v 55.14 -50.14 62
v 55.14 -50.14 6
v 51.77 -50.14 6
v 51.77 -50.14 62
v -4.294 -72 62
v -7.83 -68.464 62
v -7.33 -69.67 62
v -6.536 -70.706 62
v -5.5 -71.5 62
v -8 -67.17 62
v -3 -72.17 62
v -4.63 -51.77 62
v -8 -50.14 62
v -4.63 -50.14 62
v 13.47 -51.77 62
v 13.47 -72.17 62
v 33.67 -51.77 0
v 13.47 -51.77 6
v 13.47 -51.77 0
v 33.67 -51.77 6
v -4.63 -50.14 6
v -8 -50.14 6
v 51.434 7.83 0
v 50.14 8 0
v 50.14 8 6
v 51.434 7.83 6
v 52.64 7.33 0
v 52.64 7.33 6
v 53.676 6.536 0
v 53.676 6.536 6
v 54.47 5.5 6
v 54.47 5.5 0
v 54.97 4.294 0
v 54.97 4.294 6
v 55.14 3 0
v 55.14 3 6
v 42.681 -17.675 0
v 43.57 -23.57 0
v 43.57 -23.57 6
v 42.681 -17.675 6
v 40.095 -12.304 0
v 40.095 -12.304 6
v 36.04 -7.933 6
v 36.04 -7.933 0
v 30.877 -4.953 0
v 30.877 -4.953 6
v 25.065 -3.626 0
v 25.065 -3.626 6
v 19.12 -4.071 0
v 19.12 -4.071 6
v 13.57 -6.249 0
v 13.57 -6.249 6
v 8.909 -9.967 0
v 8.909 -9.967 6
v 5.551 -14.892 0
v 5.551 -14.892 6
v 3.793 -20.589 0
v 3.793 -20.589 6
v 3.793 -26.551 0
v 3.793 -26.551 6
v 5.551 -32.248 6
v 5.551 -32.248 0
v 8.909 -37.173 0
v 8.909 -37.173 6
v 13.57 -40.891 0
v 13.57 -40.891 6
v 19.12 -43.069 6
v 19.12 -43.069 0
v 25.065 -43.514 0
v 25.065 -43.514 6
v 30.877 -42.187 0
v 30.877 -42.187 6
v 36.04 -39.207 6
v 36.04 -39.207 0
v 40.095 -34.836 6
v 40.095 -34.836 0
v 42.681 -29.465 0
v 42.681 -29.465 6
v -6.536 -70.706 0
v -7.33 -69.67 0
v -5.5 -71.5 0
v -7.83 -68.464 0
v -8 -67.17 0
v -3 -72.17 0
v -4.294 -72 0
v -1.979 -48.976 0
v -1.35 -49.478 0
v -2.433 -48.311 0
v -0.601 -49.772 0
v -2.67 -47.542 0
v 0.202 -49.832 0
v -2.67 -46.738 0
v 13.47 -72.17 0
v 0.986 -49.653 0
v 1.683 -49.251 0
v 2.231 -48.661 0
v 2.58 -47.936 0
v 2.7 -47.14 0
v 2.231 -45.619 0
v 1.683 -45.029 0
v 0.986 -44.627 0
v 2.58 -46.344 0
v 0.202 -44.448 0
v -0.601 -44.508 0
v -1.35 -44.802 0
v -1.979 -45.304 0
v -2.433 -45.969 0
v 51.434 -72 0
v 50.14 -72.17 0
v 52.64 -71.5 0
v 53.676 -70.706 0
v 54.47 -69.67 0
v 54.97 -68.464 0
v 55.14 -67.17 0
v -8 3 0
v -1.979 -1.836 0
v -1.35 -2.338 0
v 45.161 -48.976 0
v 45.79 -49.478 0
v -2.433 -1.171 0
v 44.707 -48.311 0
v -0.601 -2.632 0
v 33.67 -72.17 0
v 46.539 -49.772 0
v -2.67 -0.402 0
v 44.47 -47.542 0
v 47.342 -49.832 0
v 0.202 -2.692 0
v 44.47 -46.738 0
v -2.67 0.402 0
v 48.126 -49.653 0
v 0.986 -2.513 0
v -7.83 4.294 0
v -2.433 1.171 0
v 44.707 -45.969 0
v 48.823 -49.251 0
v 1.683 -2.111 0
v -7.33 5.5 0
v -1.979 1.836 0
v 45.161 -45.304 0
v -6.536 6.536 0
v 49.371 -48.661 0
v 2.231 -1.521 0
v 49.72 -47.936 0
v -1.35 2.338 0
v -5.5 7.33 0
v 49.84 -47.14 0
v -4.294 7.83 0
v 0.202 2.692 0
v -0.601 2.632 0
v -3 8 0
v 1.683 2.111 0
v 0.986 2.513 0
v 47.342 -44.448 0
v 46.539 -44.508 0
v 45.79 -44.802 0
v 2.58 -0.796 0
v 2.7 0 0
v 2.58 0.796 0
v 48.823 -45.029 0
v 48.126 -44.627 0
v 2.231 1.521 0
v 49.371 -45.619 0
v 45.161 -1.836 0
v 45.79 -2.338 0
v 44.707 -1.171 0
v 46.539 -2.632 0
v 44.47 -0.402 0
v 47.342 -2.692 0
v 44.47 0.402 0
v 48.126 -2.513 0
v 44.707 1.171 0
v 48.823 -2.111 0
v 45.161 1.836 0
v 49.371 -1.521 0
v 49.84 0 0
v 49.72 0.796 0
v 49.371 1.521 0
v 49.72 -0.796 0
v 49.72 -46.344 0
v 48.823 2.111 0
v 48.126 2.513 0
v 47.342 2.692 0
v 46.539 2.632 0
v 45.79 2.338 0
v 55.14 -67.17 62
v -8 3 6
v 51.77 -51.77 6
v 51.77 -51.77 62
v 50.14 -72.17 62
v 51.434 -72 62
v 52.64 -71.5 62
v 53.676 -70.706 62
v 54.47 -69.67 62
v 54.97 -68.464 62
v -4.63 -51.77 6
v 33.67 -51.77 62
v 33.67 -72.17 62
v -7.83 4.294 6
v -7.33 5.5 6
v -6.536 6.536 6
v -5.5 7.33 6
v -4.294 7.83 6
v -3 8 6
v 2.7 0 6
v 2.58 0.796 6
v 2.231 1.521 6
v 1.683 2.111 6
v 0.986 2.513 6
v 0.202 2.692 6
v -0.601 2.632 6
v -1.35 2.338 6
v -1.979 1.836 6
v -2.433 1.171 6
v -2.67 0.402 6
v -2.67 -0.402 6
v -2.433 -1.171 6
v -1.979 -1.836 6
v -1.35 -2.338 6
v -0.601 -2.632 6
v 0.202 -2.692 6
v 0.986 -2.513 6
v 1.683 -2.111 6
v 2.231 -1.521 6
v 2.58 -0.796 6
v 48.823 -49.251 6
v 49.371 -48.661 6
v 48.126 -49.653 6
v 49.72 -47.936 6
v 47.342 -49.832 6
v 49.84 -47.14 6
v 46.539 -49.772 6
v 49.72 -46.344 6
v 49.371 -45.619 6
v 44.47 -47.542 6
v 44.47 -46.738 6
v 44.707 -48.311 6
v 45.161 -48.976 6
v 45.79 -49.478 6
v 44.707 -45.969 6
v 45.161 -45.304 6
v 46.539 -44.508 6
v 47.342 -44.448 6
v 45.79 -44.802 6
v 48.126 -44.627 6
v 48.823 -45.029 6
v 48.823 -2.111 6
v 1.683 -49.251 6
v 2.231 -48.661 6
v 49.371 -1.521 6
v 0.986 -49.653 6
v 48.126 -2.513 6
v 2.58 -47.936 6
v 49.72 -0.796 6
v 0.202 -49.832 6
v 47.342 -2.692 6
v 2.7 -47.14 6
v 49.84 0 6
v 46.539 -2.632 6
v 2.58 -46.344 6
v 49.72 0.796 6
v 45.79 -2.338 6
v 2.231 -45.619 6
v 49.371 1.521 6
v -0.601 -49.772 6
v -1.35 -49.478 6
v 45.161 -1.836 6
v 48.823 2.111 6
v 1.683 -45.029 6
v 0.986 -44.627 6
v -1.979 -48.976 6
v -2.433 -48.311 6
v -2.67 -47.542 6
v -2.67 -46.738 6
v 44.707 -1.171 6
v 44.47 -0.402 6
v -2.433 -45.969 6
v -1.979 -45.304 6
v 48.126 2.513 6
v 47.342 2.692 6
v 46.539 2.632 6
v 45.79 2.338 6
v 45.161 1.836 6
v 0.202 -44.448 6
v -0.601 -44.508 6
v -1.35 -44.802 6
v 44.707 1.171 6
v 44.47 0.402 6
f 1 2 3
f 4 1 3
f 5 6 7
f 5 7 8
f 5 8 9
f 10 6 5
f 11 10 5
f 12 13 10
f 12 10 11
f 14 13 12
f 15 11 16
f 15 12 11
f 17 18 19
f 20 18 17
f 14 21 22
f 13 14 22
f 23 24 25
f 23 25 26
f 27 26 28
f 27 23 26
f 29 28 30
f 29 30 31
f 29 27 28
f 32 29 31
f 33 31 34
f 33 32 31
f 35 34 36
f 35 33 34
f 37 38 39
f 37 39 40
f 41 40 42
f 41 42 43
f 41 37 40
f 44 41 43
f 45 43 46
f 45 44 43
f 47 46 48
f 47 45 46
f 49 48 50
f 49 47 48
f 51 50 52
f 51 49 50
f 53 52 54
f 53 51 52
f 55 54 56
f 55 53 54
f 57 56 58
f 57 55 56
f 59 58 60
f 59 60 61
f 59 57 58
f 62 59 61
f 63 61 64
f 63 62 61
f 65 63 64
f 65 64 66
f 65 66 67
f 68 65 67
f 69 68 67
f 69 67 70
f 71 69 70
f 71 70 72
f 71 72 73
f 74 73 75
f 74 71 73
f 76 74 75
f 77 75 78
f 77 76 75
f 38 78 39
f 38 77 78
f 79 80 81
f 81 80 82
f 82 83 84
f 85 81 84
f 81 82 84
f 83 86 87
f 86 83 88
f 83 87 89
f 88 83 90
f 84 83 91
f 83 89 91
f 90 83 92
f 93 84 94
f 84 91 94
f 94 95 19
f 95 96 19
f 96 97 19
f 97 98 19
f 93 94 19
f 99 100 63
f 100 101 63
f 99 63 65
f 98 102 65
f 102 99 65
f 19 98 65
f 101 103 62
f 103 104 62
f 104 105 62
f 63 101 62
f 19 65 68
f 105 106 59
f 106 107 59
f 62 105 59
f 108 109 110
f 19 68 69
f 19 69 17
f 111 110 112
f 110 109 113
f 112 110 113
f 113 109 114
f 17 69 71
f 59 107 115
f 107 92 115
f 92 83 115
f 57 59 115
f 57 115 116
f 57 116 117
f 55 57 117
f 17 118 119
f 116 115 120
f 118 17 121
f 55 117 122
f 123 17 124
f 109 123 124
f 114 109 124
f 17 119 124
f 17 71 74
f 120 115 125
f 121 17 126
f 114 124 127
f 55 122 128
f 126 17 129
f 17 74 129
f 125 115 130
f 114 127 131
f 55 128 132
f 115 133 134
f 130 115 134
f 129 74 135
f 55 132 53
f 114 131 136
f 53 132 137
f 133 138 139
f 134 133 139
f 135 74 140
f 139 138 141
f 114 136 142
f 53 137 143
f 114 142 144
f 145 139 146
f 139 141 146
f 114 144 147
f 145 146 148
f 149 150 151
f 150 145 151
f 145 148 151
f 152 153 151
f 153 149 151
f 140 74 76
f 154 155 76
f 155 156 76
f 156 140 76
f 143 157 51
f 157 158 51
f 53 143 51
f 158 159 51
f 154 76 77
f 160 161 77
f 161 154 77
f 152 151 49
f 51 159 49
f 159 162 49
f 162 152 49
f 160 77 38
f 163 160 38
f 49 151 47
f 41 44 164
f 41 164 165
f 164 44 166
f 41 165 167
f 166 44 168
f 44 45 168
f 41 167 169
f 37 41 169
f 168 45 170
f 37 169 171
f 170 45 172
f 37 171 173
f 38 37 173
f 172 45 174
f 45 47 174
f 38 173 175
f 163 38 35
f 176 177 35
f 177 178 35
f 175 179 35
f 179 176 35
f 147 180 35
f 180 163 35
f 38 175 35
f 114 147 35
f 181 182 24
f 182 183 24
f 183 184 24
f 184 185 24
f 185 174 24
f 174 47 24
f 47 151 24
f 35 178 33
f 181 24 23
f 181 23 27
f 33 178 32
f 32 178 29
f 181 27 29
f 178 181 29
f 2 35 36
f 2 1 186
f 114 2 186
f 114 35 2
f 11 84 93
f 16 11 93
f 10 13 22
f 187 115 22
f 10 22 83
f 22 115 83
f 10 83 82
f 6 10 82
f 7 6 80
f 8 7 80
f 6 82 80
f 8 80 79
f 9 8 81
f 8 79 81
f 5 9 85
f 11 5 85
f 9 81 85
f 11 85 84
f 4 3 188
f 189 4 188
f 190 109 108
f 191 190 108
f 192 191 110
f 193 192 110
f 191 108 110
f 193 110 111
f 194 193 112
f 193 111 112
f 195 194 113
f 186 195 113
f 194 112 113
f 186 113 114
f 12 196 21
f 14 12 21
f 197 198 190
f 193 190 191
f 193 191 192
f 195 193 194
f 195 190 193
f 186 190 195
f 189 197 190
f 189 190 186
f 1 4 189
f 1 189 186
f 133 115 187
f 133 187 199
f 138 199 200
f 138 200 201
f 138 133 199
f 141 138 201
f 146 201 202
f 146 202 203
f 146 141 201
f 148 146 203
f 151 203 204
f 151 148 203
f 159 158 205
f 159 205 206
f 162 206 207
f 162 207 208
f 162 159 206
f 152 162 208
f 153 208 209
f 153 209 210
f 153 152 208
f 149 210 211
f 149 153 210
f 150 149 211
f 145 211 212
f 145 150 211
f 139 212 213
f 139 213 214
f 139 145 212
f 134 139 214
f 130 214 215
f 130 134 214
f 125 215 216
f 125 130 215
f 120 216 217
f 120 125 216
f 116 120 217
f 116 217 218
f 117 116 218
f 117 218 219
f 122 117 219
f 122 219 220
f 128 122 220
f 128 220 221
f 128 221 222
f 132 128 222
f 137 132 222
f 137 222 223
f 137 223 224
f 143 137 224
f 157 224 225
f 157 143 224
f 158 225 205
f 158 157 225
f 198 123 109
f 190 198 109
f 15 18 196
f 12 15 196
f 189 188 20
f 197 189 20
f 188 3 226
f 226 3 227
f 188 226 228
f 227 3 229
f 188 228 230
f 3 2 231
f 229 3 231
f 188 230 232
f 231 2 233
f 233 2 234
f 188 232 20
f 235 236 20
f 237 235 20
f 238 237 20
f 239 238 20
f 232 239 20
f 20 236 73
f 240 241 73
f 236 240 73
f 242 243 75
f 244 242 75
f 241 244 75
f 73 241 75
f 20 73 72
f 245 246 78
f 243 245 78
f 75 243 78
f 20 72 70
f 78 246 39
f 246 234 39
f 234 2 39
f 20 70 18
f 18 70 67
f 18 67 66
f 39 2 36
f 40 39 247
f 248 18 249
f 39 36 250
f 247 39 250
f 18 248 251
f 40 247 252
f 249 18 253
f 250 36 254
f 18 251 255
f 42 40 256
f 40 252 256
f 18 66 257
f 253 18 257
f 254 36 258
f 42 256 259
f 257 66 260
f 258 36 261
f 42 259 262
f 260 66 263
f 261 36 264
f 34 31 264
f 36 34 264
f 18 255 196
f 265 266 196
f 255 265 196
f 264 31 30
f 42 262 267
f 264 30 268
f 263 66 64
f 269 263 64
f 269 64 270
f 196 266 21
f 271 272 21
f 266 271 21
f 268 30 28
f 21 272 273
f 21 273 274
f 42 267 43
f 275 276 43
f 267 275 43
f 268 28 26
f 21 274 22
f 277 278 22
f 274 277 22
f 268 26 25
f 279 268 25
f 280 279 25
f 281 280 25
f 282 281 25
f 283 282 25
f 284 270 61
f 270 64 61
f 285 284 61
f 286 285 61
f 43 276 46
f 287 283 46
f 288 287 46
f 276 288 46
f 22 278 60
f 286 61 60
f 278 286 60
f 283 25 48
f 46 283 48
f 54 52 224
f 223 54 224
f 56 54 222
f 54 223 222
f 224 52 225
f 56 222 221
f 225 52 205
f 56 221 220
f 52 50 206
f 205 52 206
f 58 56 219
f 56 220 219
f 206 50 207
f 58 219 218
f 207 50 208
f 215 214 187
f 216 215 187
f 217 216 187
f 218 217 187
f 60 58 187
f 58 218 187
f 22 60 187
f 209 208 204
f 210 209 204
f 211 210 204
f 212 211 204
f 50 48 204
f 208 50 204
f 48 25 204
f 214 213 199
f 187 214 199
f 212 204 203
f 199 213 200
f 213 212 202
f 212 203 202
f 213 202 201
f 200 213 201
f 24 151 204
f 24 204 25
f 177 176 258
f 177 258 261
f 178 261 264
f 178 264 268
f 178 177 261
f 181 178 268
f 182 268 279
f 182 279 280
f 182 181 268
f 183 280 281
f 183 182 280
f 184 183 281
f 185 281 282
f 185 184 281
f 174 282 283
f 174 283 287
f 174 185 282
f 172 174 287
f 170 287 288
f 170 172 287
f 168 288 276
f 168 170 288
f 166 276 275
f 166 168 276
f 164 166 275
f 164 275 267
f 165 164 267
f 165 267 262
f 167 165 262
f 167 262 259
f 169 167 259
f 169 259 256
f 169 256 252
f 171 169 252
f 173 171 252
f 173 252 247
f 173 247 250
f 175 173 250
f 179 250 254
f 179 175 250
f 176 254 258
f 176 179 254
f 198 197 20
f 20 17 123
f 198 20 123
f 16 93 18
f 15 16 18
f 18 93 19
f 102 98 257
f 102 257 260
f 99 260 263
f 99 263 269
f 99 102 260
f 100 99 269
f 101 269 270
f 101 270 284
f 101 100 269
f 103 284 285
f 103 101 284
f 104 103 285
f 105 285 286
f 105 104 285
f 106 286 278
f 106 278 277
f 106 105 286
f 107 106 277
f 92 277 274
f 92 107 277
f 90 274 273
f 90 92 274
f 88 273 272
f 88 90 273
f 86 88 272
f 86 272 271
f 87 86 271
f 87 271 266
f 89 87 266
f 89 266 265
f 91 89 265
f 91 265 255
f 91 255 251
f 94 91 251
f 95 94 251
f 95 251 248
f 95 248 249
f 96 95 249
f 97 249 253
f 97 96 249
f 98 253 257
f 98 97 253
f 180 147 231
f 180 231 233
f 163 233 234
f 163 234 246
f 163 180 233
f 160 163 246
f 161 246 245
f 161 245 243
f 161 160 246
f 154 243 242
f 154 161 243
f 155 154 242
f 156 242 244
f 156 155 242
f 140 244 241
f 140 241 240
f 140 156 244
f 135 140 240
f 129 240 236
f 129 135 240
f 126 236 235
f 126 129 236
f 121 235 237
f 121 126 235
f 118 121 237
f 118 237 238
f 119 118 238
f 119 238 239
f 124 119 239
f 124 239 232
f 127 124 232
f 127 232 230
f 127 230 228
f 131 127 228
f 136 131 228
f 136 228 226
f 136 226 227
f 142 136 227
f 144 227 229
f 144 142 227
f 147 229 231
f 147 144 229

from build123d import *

# Parameters (mm, degrees)
CROQUIS1_R                   = 2.7
CROQUIS1_R_2                 = 20
SALIENTE_EXTRUIR1_DEPTH      = 6
SALIENTE_EXTRUIR2_DEPTH      = 56
SALIENTE_EXTRUIR2_DEPTH_BACK = 6
CROQUIS3_W                   = 20.2
CROQUIS3_H                   = 20.4
CORTAR_EXTRUIR1_DEPTH        = 110.967852121


with BuildPart() as part:
    # Croquis1 → Saliente-Extruir1 (new body)
    with BuildSketch(Plane.XY):
        with BuildLine():
            Line((-8, -50.14), (-8, 3))
            ThreePointArc((-8, 3), (-6.535533906, 6.535533906), (-3, 8))
            Line((-3, 8), (50.14, 8))
            ThreePointArc((50.14, 8), (53.675533906, 6.535533906), (55.14, 3))
            Line((55.14, 3), (55.14, -50.14))
            ThreePointArc((55.14, -50.14), (53.675533906, -53.675533906), (50.14, -55.14))
            Line((50.14, -55.14), (-3, -55.14))
            ThreePointArc((-3, -55.14), (-6.535533906, -53.675533906), (-8, -50.14))
        make_face()
        Circle(CROQUIS1_R, mode=Mode.SUBTRACT)
        with Locations((47.14, 0)):
            Circle(CROQUIS1_R, mode=Mode.SUBTRACT)
        with Locations((47.14, -47.14)):
            Circle(CROQUIS1_R, mode=Mode.SUBTRACT)
        with Locations((0, -47.14)):
            Circle(CROQUIS1_R, mode=Mode.SUBTRACT)
        with Locations((23.57, -23.57)):
            Circle(CROQUIS1_R_2, mode=Mode.SUBTRACT)
    extrude(amount=SALIENTE_EXTRUIR1_DEPTH)

    # Croquis2 → Saliente-Extruir2 (add, two sides: drawn at the far end of the back side and taken through both)
    with BuildSketch(Plane.XY.offset(6).offset(-SALIENTE_EXTRUIR2_DEPTH_BACK)):
        with BuildLine():
            ThreePointArc((-3, -55.14), (-6.535533906, -53.675533906), (-8, -50.14))
            Line((-8, -50.14), (-8, -67.17))
            ThreePointArc((-8, -67.17), (-6.535533906, -70.705533906), (-3, -72.17))
            Line((-3, -72.17), (13.47, -72.17))
            Line((13.47, -72.17), (13.47, -55.14))
            Line((13.47, -55.14), (-3, -55.14))
        make_face()
        with BuildLine():
            Line((55.14, -67.17), (55.14, -50.14))
            ThreePointArc((55.14, -50.14), (53.675533906, -53.675533906), (50.14, -55.14))
            Line((50.14, -55.14), (33.67, -55.14))
            Line((33.67, -55.14), (33.67, -72.17))
            Line((33.67, -72.17), (50.14, -72.17))
            ThreePointArc((50.14, -72.17), (53.675533906, -70.705533906), (55.14, -67.17))
        make_face()
        with BuildLine():
            Line((13.47, -51.77), (-4.63, -51.77))
            Line((-4.63, -51.77), (-4.63, -50.14))
            Line((-4.63, -50.14), (-8, -50.14))
            ThreePointArc((-8, -50.14), (-6.535533906, -53.675533906), (-3, -55.14))
            Line((-3, -55.14), (13.47, -55.14))
            Line((13.47, -55.14), (13.47, -51.77))
        make_face()
        with BuildLine():
            Line((55.14, -50.14), (51.77, -50.14))
            Line((51.77, -50.14), (51.77, -51.77))
            Line((51.77, -51.77), (33.67, -51.77))
            Line((33.67, -51.77), (33.67, -55.14))
            Line((33.67, -55.14), (50.14, -55.14))
            ThreePointArc((50.14, -55.14), (53.675533906, -53.675533906), (55.14, -50.14))
        make_face()
    extrude(amount=SALIENTE_EXTRUIR2_DEPTH + SALIENTE_EXTRUIR2_DEPTH_BACK)

    # Croquis3 → Cortar-Extruir1 (cut, through all)
    with BuildSketch(Plane.XY.offset(62)):
        with Locations((23.57, -61.97)):
            Rectangle(CROQUIS3_W, CROQUIS3_H)
    extrude(amount=-CORTAR_EXTRUIR1_DEPTH, mode=Mode.SUBTRACT)


solid = part.part
